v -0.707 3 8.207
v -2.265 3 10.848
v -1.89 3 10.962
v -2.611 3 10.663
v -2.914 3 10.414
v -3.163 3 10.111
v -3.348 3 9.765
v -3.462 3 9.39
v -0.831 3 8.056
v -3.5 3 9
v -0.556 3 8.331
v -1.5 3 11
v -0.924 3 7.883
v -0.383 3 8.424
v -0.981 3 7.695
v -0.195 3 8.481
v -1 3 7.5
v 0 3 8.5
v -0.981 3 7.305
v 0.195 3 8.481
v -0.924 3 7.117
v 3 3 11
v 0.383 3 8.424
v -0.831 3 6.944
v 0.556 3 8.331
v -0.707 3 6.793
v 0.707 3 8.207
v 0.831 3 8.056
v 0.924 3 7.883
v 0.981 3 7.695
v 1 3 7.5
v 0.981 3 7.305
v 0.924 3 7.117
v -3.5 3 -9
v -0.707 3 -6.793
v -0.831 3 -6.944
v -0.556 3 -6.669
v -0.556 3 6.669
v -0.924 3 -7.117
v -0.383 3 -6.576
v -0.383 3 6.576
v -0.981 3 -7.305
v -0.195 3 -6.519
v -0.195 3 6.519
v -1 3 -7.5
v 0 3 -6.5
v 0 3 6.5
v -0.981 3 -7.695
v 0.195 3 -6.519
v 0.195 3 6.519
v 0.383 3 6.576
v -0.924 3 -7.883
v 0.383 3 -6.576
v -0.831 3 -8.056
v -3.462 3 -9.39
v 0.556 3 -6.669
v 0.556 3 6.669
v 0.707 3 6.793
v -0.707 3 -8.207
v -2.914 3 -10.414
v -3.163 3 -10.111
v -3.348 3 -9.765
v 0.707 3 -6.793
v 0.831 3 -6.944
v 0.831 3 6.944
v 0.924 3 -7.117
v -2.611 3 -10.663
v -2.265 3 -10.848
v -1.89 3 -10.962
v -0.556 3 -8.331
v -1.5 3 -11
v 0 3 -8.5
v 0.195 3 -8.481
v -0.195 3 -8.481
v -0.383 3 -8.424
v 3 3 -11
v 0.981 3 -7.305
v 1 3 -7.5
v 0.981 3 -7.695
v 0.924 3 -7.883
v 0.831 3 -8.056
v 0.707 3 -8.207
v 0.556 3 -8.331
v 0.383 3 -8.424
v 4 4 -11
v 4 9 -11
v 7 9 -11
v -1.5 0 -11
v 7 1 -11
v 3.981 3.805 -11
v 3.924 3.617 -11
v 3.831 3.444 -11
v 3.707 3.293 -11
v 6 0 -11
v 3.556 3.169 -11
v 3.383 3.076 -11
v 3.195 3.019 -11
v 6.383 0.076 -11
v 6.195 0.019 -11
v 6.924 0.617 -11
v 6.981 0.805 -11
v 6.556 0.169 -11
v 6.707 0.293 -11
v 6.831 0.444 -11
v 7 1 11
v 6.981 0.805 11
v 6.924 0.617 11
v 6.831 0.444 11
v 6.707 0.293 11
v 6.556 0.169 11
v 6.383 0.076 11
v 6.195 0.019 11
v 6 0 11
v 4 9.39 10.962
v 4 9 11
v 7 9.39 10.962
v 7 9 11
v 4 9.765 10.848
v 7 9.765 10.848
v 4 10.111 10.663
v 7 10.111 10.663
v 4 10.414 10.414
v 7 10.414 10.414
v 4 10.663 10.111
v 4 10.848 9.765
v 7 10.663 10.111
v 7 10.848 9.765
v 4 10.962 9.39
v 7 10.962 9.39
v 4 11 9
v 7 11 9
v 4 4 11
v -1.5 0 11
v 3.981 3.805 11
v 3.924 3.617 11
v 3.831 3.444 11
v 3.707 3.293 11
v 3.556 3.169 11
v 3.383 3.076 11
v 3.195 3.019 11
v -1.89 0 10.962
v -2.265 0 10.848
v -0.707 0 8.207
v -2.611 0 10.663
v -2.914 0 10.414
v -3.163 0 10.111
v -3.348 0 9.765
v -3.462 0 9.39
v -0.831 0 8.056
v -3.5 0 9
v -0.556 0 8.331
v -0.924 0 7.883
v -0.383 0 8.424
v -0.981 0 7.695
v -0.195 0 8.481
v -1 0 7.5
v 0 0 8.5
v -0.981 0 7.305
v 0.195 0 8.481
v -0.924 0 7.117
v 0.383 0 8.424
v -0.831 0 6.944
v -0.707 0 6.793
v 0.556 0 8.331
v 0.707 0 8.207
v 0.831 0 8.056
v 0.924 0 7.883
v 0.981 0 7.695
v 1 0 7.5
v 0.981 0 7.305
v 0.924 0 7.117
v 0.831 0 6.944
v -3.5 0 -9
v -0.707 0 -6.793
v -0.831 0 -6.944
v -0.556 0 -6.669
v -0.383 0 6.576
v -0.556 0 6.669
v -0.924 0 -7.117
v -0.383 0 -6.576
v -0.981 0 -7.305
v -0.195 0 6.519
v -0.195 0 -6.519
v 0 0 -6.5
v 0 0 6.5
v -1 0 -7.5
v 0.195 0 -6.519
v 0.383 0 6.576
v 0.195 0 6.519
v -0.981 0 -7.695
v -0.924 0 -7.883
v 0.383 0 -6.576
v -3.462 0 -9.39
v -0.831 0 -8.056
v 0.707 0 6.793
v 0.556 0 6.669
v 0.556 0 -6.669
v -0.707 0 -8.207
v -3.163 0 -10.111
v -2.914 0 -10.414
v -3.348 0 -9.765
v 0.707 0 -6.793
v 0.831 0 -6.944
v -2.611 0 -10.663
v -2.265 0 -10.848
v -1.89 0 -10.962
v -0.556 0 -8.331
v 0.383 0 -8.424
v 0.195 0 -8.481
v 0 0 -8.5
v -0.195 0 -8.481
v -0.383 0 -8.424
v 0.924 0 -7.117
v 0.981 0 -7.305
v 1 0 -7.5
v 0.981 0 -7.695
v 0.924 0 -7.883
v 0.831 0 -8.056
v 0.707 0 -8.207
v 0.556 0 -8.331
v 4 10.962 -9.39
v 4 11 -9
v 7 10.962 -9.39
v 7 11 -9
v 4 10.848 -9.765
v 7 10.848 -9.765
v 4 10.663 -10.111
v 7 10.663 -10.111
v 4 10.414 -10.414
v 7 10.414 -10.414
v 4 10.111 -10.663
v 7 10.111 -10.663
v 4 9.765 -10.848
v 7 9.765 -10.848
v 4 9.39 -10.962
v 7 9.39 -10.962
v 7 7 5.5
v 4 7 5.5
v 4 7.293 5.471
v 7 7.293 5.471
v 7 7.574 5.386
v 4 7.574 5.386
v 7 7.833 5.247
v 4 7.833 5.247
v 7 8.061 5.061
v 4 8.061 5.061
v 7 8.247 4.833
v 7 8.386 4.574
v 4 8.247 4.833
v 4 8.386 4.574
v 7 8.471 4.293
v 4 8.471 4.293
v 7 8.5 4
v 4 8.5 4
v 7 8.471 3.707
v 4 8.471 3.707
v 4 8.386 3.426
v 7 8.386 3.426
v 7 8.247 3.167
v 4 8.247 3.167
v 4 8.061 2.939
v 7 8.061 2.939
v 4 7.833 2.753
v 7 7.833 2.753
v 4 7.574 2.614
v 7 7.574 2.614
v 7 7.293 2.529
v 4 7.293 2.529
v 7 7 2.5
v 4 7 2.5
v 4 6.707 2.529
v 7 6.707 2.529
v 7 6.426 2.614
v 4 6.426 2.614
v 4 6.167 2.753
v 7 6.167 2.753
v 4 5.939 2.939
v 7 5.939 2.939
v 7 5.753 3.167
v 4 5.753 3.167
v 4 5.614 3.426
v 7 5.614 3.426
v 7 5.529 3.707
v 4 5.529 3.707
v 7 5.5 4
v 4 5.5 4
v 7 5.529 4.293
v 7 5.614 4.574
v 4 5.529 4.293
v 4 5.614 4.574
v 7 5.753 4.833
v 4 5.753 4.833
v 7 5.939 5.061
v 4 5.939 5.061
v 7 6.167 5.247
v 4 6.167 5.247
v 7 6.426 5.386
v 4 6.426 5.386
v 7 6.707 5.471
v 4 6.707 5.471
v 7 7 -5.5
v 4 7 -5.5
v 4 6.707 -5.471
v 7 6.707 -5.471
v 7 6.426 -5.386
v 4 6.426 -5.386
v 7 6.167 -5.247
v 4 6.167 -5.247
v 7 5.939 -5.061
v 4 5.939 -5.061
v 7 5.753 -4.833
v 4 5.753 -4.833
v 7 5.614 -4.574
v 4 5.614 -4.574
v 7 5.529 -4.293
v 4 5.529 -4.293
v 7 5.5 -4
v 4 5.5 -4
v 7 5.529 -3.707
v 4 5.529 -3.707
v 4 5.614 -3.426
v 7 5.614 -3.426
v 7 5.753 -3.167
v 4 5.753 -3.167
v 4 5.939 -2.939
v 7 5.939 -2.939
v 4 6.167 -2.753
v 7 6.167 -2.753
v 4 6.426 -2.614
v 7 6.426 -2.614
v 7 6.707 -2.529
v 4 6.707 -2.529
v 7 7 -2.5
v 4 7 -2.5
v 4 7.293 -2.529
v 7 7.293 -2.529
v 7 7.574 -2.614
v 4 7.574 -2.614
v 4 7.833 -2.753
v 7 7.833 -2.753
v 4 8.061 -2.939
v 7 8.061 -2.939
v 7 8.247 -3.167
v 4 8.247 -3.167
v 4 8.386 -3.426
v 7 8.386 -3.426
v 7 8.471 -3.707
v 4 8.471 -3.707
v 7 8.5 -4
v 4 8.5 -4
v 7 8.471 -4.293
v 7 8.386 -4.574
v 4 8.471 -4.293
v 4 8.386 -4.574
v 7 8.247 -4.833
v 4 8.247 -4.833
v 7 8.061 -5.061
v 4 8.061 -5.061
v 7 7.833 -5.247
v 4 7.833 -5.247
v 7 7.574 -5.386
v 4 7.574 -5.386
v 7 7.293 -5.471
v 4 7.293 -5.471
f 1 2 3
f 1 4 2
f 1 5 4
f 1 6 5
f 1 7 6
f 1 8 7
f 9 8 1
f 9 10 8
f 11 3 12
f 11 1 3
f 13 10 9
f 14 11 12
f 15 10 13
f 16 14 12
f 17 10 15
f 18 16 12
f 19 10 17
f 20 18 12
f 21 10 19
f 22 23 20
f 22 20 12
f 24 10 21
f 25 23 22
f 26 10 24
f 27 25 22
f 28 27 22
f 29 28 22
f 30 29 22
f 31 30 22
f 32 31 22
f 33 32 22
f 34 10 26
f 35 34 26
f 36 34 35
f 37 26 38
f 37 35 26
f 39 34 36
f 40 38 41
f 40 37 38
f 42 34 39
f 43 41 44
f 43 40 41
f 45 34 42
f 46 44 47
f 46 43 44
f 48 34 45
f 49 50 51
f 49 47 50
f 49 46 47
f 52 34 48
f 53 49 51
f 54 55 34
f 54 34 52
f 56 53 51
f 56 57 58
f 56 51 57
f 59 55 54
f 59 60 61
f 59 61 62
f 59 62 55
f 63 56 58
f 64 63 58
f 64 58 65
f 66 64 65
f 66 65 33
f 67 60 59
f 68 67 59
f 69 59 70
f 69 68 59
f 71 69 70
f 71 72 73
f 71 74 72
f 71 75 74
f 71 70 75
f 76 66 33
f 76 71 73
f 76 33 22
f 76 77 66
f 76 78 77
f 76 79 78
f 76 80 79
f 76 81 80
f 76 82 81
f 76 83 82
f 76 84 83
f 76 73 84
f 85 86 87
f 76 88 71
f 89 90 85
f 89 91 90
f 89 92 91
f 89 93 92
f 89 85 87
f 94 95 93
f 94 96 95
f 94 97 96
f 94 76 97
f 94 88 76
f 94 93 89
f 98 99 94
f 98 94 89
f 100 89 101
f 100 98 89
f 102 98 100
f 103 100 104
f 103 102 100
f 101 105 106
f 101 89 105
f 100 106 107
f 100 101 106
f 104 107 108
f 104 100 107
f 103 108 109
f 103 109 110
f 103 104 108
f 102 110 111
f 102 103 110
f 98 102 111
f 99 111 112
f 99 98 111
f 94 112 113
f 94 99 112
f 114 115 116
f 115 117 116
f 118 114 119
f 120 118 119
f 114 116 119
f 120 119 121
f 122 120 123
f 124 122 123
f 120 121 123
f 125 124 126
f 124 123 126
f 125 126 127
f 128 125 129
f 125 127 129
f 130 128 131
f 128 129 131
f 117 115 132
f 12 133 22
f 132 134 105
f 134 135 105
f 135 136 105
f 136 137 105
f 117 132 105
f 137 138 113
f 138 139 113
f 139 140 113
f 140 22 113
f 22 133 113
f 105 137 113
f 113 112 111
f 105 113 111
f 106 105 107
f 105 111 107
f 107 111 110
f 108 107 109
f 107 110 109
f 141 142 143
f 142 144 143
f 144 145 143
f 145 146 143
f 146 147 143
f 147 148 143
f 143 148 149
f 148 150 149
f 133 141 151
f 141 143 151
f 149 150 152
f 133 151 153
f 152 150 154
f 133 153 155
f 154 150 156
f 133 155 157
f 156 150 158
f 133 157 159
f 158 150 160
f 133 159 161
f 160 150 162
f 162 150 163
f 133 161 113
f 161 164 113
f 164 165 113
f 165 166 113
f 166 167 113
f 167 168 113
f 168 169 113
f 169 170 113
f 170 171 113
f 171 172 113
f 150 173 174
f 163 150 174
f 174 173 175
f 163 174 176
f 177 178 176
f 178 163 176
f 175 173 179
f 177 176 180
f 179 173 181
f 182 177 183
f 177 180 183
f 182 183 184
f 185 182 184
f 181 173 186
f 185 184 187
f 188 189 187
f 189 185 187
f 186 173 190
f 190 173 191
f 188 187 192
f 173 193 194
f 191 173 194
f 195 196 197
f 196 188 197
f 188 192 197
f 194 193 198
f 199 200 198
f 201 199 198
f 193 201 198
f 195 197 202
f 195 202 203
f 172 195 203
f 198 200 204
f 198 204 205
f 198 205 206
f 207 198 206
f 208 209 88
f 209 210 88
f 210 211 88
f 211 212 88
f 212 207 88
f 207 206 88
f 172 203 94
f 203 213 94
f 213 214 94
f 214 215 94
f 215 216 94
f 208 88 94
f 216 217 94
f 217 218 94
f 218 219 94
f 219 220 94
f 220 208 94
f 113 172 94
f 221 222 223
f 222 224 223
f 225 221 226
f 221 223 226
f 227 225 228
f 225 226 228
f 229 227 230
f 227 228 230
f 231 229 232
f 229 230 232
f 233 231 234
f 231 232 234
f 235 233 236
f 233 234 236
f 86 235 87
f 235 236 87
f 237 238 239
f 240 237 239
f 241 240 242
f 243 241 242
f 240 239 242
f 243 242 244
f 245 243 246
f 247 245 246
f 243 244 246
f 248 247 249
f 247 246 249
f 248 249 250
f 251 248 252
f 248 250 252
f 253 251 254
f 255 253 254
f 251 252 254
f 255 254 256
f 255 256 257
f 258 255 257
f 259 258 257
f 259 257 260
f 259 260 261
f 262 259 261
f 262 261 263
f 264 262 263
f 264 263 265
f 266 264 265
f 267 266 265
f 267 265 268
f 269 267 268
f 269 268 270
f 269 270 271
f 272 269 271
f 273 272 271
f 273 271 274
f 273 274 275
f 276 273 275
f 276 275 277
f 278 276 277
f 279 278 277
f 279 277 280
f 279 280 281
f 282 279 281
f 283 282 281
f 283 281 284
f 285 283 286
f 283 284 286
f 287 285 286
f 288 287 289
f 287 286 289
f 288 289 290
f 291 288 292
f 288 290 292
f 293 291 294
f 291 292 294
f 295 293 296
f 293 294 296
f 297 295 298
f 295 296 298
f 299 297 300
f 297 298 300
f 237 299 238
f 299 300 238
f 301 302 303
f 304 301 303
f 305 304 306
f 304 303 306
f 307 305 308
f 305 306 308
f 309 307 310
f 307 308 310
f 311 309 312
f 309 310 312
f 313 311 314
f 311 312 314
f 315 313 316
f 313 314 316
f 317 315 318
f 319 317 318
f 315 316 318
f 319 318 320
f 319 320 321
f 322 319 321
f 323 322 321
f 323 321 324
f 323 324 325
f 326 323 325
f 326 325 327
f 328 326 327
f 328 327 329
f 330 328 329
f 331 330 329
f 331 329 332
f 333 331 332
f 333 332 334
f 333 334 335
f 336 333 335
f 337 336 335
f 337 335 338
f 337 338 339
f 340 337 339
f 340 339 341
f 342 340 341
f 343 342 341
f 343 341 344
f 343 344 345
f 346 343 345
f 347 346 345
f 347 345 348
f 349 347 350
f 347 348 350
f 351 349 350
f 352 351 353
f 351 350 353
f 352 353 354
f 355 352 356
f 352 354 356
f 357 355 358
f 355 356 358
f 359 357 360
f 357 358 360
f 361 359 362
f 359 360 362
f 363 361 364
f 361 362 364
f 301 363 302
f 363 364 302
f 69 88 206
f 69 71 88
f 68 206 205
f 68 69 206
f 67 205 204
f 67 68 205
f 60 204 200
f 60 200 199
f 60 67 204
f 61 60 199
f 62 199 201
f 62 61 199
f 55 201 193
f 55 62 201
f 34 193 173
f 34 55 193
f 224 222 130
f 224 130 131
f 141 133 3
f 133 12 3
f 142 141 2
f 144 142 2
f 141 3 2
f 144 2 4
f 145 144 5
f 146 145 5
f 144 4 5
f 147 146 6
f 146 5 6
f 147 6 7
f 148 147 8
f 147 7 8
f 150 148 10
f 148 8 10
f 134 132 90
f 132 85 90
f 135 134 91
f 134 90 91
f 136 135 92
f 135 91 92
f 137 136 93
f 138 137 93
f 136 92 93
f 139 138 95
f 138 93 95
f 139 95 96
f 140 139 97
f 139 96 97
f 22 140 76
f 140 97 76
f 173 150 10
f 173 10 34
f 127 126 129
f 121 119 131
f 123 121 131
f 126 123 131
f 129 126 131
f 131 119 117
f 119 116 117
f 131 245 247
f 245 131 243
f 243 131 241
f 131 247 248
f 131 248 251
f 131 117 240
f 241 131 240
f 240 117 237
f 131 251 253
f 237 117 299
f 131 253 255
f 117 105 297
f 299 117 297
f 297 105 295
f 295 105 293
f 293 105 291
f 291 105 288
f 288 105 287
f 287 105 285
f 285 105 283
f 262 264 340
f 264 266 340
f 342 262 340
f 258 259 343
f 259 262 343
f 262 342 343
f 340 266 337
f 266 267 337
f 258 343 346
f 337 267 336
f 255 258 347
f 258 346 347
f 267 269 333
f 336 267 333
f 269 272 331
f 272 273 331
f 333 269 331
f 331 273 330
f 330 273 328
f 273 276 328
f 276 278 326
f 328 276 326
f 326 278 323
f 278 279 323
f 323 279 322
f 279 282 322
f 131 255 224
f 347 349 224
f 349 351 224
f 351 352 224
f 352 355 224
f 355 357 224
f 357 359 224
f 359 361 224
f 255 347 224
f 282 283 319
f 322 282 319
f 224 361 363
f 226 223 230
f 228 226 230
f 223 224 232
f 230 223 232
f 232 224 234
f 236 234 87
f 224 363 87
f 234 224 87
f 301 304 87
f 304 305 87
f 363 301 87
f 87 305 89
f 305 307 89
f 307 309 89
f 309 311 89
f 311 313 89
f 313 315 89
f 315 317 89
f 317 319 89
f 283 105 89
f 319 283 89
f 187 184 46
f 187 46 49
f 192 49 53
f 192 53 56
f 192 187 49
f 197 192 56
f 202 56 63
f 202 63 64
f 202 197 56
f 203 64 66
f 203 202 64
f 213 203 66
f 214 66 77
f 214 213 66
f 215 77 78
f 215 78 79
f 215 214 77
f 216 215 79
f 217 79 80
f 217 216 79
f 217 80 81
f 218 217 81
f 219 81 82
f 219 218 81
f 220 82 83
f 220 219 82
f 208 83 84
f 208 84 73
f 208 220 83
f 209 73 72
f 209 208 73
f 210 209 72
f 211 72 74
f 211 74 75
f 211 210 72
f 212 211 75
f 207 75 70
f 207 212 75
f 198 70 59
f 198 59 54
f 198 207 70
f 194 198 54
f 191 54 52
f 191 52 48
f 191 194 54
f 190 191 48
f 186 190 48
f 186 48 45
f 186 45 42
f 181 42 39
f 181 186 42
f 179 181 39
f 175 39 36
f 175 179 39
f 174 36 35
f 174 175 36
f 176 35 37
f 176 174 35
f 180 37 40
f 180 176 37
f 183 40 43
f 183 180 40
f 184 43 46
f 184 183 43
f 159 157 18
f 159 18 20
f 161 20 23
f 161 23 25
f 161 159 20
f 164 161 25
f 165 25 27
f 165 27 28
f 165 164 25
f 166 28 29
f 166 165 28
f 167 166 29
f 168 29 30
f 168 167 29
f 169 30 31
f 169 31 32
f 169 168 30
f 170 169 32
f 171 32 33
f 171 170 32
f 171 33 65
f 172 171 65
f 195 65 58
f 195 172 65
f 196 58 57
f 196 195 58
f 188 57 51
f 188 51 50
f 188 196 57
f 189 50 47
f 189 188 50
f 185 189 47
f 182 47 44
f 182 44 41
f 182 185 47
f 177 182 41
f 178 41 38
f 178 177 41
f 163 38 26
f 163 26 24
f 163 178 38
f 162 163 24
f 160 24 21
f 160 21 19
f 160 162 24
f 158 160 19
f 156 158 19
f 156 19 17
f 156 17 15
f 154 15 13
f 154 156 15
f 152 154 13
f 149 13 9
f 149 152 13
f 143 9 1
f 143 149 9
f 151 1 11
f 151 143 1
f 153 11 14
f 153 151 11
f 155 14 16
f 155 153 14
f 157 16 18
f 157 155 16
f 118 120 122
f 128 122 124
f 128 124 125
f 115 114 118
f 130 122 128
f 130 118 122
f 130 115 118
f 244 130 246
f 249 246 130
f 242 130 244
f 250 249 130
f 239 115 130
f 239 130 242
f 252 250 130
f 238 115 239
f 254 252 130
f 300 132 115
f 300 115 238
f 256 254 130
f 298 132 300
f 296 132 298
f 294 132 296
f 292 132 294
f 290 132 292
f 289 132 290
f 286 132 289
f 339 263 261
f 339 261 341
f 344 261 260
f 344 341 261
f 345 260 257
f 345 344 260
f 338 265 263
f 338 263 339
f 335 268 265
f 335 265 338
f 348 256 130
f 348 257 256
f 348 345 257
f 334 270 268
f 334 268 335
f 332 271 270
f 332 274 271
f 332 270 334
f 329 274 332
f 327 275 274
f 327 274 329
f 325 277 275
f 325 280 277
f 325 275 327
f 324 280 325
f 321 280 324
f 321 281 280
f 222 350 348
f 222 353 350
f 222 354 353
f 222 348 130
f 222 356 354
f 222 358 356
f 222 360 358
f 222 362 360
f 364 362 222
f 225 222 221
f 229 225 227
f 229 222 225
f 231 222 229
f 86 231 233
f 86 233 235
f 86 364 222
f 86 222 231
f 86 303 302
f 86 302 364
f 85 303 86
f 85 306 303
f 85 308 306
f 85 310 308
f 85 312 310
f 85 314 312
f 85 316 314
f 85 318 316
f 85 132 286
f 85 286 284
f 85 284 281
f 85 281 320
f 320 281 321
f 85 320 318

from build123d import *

# Parameters (mm, degrees)
SKETCH_1_W          = 7
SKETCH_1_H          = 22
SKETCH_1_R          = 1
SKETCH_1_W_2        = 3.5
EXTRUDE_1_DEPTH     = 3
SKETCH_2_W          = 3
SKETCH_2_H          = 22
EXTRUDE_2_DEPTH     = 8
SKETCH_3_R          = 1.5
CUT_EXTRUDE_1_DEPTH = 8
FILLET_1_R          = 2
FILLET_2_R          = 1


with BuildPart() as part:
    # 草图1 → 凸台-拉伸1 (new body)
    # profile 1 of 2: a face of its own
    with BuildSketch(Plane(origin=(0, 0, 0), x_dir=(1, 0, 0), z_dir=(0, 1, 0))):
        Rectangle(SKETCH_1_W, SKETCH_1_H)
        with Locations(Location((0, 7.5, 0), (0, 0, 270))):
            Circle(SKETCH_1_R, mode=Mode.SUBTRACT)
        with Locations(Location((0, -7.5, 0), (0, 0, 270))):
            Circle(SKETCH_1_R, mode=Mode.SUBTRACT)
    # profile 2 of 2: a face of its own
    with BuildSketch(Plane(origin=(0, 0, 0), x_dir=(1, 0, 0), z_dir=(0, 1, 0))):
        with Locations((5.25, 0)):
            Rectangle(SKETCH_1_W_2, SKETCH_1_H)
    extrude(amount=EXTRUDE_1_DEPTH)

    # 草图2 → 凸台-拉伸2 (add)
    with BuildSketch(Plane(origin=(0, 3, 0), x_dir=(1, 0, 0), z_dir=(0, 1, 0))):
        with Locations((5.5, 0)):
            Rectangle(SKETCH_2_W, SKETCH_2_H)
    extrude(amount=EXTRUDE_2_DEPTH)

    # 草图3 → 切除-拉伸1 (cut)
    with BuildSketch(Plane.ZY.offset(-4)):
        with Locations((4, 7)):
            Circle(SKETCH_3_R)
        with Locations(Location((-4, 7, 0), (0, 0, 180))):
            Circle(SKETCH_3_R)
    extrude(amount=-CUT_EXTRUDE_1_DEPTH, mode=Mode.SUBTRACT)

    # 圆角1
    fillet_1_edges = [part.edges().sort_by_distance(p)[0] for p in [
        (-3.5, 1.5, 11),
        (-3.5, 1.5, -11),
        (5.5, 11, -11),
        (5.5, 11, 11),
    ]]
    fillet(fillet_1_edges, radius=FILLET_1_R)

    # 圆角2
    fillet_2_edges = [part.edges().sort_by_distance(p)[0] for p in [
        (7, 0, 0),
        (4, 3, 0),
    ]]
    fillet(fillet_2_edges, radius=FILLET_2_R)


solid = part.part
